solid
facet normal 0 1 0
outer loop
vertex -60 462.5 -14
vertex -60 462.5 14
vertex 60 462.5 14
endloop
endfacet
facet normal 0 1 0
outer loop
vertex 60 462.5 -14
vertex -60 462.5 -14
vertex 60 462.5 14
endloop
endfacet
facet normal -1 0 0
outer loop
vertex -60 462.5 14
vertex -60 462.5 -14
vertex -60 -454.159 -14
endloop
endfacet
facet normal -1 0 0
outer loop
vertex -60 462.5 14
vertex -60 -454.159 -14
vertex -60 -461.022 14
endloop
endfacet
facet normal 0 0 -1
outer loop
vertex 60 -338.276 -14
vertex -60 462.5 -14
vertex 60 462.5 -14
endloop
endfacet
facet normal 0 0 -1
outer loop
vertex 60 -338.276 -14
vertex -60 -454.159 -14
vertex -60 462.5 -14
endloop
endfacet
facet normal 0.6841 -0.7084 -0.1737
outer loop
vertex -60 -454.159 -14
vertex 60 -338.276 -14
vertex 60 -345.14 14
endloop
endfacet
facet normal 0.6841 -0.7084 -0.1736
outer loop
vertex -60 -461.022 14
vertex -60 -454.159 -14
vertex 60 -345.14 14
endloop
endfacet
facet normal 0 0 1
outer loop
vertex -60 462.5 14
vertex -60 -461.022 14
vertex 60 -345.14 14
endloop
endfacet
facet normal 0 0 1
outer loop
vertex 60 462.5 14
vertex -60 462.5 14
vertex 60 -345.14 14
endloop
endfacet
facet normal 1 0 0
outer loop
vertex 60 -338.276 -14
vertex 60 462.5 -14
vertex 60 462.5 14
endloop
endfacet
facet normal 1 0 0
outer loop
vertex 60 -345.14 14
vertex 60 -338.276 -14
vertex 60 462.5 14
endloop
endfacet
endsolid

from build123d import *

# Parameters (mm, degrees)
F0_W        = 120
F0_H        = 28
F1_DEPTH    = 462.5
F2_SIZE2    = 115.882643
F2_SIZE     = 119.99999
F3_T1_DEPTH = 343.6641668027


# Not quite as in the source:
# - a fillet or chamfer that OpenCascade refuses, or shapes differently, is made with other operations: its cross-section is extruded or revolved along the edge and cut away or added
# - a fillet or chamfer is up to 0.001 mm smaller than in the source, because OpenCascade refuses the exact size


with BuildPart() as f1:
    # F0 (on Front) → F1 (new body, symmetric)
    with BuildSketch(Plane.XZ):
        Rectangle(F0_W, F0_H)
    extrude(amount=F1_DEPTH, both=True)

    # F2 (size 120 and 115.8826529768 in the source; OpenCascade refuses exactly that, so slightly less here)
    f2_edges = [f1.edges().sort_by_distance(p)[0] for p in [
        (60, -462.5, 0),
    ]]
    f2_side = f1.faces().sort_by_distance((0, -462.5, 0))[0]
    chamfer(f2_edges, length=F2_SIZE, length2=F2_SIZE2, reference=f2_side)

    # F3: chamfer of 6 x 34.0276909177 on 2 edges, made by hand

    # F3_s2 → F3_t1 (cut)
    with BuildSketch(Plane(origin=(-325.7617702656, -314.5844839382, 0), x_dir=(0, 0, 1), z_dir=(0.7193398013, 0.6946583695, 0))):
        Polygon((-14, 285.0151628785), (20.0276909177, 291.0151628785), (-14, 291.0151628785), align=None)
    extrude(amount=F3_T1_DEPTH, mode=Mode.SUBTRACT)


solid = f1.part
